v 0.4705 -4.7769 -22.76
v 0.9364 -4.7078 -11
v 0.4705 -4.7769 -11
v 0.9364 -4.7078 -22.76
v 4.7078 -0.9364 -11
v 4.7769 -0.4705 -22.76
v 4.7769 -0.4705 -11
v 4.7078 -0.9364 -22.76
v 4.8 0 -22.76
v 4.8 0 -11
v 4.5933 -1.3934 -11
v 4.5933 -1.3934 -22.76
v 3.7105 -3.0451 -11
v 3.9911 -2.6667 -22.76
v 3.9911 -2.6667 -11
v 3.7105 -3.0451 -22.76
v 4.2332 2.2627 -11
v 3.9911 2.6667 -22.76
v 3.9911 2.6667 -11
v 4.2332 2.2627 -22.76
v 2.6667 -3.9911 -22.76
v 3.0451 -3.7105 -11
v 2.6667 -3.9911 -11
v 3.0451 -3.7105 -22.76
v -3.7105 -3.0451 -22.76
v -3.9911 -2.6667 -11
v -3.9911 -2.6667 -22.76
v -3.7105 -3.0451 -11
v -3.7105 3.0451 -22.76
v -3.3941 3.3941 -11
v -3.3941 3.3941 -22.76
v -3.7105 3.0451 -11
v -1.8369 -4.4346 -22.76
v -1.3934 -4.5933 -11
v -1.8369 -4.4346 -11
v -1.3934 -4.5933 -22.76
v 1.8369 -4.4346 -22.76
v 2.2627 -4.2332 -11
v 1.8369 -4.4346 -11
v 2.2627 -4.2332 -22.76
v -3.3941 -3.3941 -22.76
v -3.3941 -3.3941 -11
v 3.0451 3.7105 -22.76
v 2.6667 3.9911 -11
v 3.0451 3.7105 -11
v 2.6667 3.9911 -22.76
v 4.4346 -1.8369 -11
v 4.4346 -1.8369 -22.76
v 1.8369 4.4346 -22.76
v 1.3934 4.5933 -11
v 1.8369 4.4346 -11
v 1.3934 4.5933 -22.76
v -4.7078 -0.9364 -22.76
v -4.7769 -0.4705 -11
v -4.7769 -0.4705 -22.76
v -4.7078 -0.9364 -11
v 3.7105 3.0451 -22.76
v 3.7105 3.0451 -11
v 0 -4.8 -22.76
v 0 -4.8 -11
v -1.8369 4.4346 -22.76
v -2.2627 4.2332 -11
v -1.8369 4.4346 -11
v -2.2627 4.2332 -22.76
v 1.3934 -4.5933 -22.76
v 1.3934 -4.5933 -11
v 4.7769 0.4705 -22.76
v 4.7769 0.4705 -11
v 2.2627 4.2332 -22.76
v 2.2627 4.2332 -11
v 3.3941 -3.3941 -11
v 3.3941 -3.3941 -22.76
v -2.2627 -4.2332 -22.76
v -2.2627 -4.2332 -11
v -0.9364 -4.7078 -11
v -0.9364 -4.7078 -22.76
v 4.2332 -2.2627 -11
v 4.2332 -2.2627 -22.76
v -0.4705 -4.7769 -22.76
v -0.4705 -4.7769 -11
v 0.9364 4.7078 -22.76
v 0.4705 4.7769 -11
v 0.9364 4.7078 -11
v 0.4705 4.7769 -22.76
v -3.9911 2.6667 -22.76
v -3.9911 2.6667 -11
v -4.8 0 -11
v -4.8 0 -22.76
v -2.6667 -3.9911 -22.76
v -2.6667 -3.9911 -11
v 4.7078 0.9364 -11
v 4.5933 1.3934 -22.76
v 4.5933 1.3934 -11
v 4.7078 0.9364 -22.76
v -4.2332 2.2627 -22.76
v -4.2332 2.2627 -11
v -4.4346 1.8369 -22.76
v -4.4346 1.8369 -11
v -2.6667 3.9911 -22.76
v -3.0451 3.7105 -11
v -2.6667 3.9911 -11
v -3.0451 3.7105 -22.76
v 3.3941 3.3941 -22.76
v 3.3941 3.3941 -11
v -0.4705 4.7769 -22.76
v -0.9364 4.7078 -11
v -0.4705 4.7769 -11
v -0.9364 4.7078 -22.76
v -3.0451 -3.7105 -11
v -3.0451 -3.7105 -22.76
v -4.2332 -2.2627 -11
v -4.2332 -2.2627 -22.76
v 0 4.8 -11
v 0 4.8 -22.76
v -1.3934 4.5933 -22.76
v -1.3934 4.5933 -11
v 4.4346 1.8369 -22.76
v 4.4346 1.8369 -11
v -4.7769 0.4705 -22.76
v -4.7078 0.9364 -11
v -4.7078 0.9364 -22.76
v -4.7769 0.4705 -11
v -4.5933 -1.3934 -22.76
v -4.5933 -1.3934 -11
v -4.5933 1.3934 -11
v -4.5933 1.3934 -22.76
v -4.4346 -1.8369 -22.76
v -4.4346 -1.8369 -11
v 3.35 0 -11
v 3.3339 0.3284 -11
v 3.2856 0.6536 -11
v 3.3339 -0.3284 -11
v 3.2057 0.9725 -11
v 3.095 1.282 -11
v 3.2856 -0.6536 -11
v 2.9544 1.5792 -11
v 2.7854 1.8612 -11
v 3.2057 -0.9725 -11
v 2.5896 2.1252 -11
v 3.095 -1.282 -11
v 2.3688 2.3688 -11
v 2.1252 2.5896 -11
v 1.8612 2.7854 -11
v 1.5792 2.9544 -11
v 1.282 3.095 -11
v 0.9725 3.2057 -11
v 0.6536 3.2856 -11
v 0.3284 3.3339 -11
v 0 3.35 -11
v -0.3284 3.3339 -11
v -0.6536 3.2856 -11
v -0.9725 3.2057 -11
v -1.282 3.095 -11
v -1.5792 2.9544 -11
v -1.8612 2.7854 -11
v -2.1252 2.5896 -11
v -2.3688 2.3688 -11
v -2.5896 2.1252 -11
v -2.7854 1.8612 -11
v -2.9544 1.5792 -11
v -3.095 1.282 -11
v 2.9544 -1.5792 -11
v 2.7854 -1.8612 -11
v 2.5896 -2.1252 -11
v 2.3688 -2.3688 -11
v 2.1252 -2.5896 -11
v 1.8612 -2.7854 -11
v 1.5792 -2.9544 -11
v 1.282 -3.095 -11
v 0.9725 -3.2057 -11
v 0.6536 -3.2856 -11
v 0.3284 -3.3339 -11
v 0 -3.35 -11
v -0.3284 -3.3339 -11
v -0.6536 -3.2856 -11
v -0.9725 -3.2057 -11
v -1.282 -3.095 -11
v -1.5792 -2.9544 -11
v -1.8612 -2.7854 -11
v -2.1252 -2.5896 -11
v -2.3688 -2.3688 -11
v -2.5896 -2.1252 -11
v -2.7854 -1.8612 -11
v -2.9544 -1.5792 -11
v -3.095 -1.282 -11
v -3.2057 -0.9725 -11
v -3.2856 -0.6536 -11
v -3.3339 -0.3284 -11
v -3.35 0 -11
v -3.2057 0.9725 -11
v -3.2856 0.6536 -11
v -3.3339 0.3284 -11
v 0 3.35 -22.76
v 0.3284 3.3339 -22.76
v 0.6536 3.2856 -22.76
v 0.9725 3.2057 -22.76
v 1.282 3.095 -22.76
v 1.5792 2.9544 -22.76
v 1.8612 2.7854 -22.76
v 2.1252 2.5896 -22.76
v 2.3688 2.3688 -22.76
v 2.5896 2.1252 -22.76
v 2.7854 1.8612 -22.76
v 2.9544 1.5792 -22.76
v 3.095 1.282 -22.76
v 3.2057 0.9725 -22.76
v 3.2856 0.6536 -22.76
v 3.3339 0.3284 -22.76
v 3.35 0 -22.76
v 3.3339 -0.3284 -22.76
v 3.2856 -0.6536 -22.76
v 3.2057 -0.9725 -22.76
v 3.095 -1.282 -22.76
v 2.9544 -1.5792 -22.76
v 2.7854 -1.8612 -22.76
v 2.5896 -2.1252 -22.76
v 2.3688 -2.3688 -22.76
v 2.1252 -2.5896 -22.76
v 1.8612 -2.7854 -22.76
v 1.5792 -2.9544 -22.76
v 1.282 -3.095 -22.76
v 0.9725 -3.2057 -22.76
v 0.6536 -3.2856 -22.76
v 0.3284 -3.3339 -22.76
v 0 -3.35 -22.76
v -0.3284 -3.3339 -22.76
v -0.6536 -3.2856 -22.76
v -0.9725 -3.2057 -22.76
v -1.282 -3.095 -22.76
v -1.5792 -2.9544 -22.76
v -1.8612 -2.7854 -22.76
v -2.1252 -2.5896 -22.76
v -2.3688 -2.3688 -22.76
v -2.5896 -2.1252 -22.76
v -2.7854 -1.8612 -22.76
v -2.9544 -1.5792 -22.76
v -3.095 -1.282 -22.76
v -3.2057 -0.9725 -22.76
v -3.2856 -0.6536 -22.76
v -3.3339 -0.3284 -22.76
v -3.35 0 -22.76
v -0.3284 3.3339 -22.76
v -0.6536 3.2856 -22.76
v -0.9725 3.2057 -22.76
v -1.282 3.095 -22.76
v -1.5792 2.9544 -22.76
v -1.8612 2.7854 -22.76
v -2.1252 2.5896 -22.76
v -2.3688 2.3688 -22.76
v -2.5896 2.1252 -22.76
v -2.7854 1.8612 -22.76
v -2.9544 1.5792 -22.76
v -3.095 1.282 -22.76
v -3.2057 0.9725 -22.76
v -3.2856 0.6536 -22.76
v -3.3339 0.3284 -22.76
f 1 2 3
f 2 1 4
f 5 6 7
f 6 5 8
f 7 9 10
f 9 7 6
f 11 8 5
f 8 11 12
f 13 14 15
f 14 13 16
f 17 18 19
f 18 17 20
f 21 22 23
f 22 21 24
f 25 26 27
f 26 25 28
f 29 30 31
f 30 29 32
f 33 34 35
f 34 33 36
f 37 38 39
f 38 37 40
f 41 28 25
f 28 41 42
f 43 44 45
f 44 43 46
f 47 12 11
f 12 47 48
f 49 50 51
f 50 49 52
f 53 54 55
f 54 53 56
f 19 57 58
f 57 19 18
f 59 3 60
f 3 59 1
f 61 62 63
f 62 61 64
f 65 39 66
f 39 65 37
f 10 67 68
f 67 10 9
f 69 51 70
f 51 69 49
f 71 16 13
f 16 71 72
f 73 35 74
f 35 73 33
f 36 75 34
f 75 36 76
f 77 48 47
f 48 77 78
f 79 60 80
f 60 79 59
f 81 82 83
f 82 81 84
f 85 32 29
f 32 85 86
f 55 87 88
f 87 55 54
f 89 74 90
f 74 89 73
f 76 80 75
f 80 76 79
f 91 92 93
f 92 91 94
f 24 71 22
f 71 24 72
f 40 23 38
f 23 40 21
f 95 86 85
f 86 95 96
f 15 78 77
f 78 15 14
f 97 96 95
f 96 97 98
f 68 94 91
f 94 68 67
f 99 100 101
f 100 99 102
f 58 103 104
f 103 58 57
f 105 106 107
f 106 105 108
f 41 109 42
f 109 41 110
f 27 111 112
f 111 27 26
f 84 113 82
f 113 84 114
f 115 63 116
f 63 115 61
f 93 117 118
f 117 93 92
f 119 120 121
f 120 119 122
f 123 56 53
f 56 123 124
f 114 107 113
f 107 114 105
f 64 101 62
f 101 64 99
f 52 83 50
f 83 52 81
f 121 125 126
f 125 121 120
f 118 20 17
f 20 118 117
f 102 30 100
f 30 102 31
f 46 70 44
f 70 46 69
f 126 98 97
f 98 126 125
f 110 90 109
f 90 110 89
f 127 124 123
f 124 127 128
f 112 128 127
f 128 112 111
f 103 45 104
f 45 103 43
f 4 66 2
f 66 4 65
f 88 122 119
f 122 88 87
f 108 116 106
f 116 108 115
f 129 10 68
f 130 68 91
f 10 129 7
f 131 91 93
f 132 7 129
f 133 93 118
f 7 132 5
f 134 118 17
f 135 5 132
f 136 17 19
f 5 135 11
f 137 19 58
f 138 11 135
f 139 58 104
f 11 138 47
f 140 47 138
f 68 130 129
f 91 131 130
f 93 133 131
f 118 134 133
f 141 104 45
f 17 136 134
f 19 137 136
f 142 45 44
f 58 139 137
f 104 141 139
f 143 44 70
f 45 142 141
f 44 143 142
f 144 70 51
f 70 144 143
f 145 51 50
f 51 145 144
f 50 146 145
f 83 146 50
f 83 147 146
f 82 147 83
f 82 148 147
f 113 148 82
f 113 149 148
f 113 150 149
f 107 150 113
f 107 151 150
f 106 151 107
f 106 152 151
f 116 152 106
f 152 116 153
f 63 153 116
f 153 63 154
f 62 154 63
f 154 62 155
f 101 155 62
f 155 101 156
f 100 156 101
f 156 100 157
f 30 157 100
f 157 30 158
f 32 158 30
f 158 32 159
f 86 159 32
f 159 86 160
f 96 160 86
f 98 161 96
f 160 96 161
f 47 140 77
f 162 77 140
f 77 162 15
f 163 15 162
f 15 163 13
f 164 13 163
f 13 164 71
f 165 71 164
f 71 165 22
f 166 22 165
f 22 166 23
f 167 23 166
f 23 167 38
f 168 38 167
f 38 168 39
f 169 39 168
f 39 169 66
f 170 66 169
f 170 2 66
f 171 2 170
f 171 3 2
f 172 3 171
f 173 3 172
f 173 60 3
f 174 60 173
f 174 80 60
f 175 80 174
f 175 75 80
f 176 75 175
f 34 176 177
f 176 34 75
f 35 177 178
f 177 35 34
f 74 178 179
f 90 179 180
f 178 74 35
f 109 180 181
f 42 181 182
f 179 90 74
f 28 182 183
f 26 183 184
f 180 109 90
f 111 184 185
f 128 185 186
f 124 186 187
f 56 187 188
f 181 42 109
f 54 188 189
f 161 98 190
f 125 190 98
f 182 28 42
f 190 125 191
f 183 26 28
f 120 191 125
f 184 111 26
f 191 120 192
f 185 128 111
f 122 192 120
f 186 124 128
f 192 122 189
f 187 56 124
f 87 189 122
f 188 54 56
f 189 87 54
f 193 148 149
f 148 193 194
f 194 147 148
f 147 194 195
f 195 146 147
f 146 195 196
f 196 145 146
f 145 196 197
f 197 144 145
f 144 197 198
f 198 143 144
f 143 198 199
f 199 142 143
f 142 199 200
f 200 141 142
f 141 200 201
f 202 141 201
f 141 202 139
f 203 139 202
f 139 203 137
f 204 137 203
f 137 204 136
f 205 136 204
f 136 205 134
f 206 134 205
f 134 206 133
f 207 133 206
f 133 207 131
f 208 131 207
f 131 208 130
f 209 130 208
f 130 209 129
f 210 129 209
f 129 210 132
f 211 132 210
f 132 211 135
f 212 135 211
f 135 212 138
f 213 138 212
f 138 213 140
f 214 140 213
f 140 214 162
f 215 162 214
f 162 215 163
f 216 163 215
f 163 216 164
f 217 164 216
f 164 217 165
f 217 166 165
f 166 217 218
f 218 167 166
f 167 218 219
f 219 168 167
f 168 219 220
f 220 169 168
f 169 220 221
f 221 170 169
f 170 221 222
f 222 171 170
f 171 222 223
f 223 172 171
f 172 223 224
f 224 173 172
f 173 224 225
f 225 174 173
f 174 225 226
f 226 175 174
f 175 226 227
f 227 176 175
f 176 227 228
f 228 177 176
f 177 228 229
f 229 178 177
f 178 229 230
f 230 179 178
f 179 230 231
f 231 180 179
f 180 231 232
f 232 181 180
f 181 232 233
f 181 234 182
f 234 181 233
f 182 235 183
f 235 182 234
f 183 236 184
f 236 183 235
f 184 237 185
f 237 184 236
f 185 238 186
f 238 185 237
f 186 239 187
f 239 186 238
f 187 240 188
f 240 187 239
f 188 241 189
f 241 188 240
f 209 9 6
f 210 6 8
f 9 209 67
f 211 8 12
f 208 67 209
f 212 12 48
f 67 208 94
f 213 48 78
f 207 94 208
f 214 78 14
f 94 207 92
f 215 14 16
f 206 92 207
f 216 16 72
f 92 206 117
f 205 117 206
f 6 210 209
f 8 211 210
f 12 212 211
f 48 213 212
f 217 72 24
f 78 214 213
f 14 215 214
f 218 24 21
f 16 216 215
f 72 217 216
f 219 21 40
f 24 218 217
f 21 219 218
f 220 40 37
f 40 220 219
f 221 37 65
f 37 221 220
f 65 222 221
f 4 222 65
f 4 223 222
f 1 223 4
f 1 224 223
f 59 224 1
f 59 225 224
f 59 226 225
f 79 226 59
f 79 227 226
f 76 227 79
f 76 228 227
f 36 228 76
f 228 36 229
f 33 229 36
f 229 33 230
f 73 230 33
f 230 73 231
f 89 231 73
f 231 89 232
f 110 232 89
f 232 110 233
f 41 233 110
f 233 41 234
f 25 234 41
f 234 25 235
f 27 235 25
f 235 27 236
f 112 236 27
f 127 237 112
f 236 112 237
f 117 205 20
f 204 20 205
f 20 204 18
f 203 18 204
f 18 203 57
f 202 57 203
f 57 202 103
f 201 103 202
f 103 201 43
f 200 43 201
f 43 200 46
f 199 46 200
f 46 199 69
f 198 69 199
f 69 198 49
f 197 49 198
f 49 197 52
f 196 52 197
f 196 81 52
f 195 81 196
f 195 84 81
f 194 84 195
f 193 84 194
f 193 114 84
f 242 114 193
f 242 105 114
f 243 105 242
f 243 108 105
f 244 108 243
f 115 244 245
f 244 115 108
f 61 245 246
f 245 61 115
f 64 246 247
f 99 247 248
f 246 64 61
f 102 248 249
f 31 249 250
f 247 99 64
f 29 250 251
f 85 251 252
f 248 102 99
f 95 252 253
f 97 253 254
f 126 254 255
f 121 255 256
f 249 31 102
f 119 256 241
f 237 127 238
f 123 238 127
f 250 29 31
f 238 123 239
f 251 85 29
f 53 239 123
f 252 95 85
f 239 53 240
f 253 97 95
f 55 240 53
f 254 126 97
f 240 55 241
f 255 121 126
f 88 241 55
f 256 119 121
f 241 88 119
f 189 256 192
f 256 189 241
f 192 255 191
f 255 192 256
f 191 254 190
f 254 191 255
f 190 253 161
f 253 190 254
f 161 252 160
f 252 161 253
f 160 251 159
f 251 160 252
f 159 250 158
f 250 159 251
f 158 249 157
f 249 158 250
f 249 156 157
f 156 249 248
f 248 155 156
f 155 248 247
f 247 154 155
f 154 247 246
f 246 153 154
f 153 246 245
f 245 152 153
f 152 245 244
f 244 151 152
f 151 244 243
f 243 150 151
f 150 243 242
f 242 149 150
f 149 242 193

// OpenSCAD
// Start: lazy_union
default_5_default_5();
// End: lazy_union

// Modules.

// 'PartMaterial undef-default - default 5.0'
module default_5_default_5() {
  // 'None : _combine_solids_and_holes'
  union() {
    // '_combine_solids_and_holes'
    difference() {
      // 'show_cage : _combine_solids_and_holes'
      union() {
        // 'thru_shaft'
        multmatrix(m=[[1.0, 0.0, 0.0, 0.0], [0.0, -1.0, 0.0, 0.0], [0.0, 0.0, -1.0, -11.0], [0.0, 0.0, 0.0, 1.0]]) {
          // 'thru_shaft : _combine_solids_and_holes'
          union() {
            // 'thru_shaft'
            cylinder(h=14.0, r1=4.800000000000001, r2=4.800000000000001, center=false, $fn=64);
          }
        }
      }
      // 'show_cage'
      multmatrix(m=[[1.0, 0.0, 0.0, 0.0], [0.0, -1.0, 0.0, 0.0], [0.0, 0.0, -1.0, -24.999], [0.0, 0.0, 0.0, 1.0]]) {
        // 'access_hole : _combine_solids_and_holes'
        union() {
          // 'access_hole'
          cylinder(h=10.0, r1=4.800000000000001, r2=4.800000000000001, center=false, $fn=64);
        }
      }
      // 'show_cage'
      multmatrix(m=[[0.0, -1.0, 0.0, 0.0], [-1.0, 0.0, 0.0, 0.0], [0.0, 0.0, -1.0, 0.0], [0.0, 0.0, 0.0, 1.0]]) {
        // 'screw_hole : _combine_solids_and_holes'
        union() {
          // 'screw_hole'
          polyhedron(points=[[0.0, 0.0, 0.0], [-3.2, 0.0, 0.0], [-3.2, 0.0, 11.0], [-3.35, 0.0, 11.0], [-3.35, 0.0, 22.759999999999998], [-4.800000000000001, 0.0, 22.759999999999998], [-4.800000000000001, 0.0, 25.0], [0.0, 0.0, 25.0], [0.0, 0.0, 0.0], [-3.18459112535103, -0.31365484905459395, 0.0], [-3.18459112535103, -0.31365484905459395, 11.0], [-3.33386883435186, -0.328357420104028, 11.0], [-3.33386883435186, -0.328357420104028, 22.759999999999998], [-4.776886688026546, -0.470482273581891, 22.759999999999998], [-4.776886688026546, -0.470482273581891, 25.0], [0.0, 0.0, 25.0], [0.0, 0.0, 0.0], [-3.1385128972903376, -0.6242890304516104, 0.0], [-3.1385128972903376, -0.6242890304516104, 11.0], [-3.285630689350822, -0.6535525787540296, 11.0], [-3.285630689350822, -0.6535525787540296, 22.759999999999998], [-4.707769345935507, -0.9364335456774158, 22.759999999999998], [-4.707769345935507, -0.9364335456774158, 25.0], [0.0, 0.0, 25.0], [0.0, 0.0, 0.0], [-3.0622090743430683, -0.9289109672142795, 0.0], [-3.0622090743430683, -0.9289109672142795, 11.0], [-3.2057501247028997, -0.9724536688024489, 11.0], [-3.2057501247028997, -0.9724536688024489, 22.759999999999998], [-4.593313611514603, -1.3933664508214194, 22.759999999999998], [-4.593313611514603, -1.3933664508214194, 25.0], [0.0, 0.0, 25.0], [0.0, 0.0, 0.0], [-2.956414504036118, -1.2245869835682874, 0.0], [-2.956414504036118, -1.2245869835682874, 11.0], [-3.0949964339128107, -1.2819894984230509, 11.0], [-3.0949964339128107, -1.2819894984230509, 22.759999999999998], [-4.434621756054177, -1.8368804753524313, 22.759999999999998], [-4.434621756054177, -1.8368804753524313, 25.0], [0.0, 0.0, 25.0], [0.0, 0.0, 0.0], [-2.8221480459147363, -1.5084695578431926, 0.0], [-2.8221480459147363, -1.5084695578431926, 11.0], [-2.9544362355669893, -1.579179068367092, 11.0], [-2.9544362355669893, -1.579179068367092, 22.759999999999998], [-4.233222068872105, -2.262704336764789, 22.759999999999998], [-4.233222068872105, -2.262704336764789, 25.0], [0.0, 0.0, 25.0], [0.0, 0.0, 0.0], [-2.660702759368145, -1.777824745662727, 0.0], [-2.660702759368145, -1.777824745662727, 11.0], [-2.7854232012135265, -1.8611602806156673, 11.0], [-2.7854232012135265, -1.8611602806156673, 22.759999999999998], [-3.991054139052218, -2.666737118494091, 22.759999999999998], [-3.991054139052218, -2.666737118494091, 25.0], [0.0, 0.0, 25.0], [0.0, 0.0, 0.0], [-2.4736334507607585, -2.030058509323666, 0.0], [-2.4736334507607585, -2.030058509323666, 11.0], [-2.589585018765169, -2.1252175019482125, 11.0], [-2.589585018765169, -2.1252175019482125, 22.759999999999998], [-3.710450176141138, -3.045087763985499, 22.759999999999998], [-3.710450176141138, -3.045087763985499, 25.0], [0.0, 0.0, 25.0], [0.0, 0.0, 0.0], [-2.2627416997969525, -2.2627416997969525, 0.0], [-2.2627416997969525, -2.2627416997969525, 11.0], [-2.3688077169749344, -2.3688077169749344, 11.0], [-2.3688077169749344, -2.3688077169749344, 22.759999999999998], [-3.394112549695429, -3.394112549695429, 22.759999999999998], [-3.394112549695429, -3.394112549695429, 25.0], [0.0, 0.0, 25.0], [0.0, 0.0, 0.0], [-2.030058509323666, -2.473633450760758, 0.0], [-2.030058509323666, -2.473633450760758, 11.0], [-2.1252175019482125, -2.5895850187651686, 11.0], [-2.1252175019482125, -2.5895850187651686, 22.759999999999998], [-3.045087763985499, -3.7104501761411375, 22.759999999999998], [-3.045087763985499, -3.7104501761411375, 25.0], [0.0, 0.0, 25.0], [0.0, 0.0, 0.0], [-1.7778247456627274, -2.660702759368145, 0.0], [-1.7778247456627274, -2.660702759368145, 11.0], [-1.8611602806156677, -2.7854232012135265, 11.0], [-1.8611602806156677, -2.7854232012135265, 22.759999999999998], [-2.6667371184940913, -3.991054139052218, 22.759999999999998], [-2.6667371184940913, -3.991054139052218, 25.0], [0.0, 0.0, 25.0], [0.0, 0.0, 0.0], [-1.508469557843193, -2.822148045914736, 0.0], [-1.508469557843193, -2.822148045914736, 11.0], [-1.5791790683670928, -2.9544362355669893, 11.0], [-1.5791790683670928, -2.9544362355669893, 22.759999999999998], [-2.2627043367647897, -4.233222068872104, 22.759999999999998], [-2.2627043367647897, -4.233222068872104, 25.0], [0.0, 0.0, 25.0], [0.0, 0.0, 0.0], [-1.2245869835682877, -2.956414504036118, 0.0], [-1.2245869835682877, -2.956414504036118, 11.0], [-1.281989498423051, -3.0949964339128107, 11.0], [-1.281989498423051, -3.0949964339128107, 22.759999999999998], [-1.8368804753524315, -4.434621756054177, 22.759999999999998], [-1.8368804753524315, -4.434621756054177, 25.0], [0.0, 0.0, 25.0], [0.0, 0.0, 0.0], [-0.9289109672142795, -3.0622090743430688, 0.0], [-0.9289109672142795, -3.0622090743430688, 11.0], [-0.9724536688024489, -3.2057501247029, 11.0], [-0.9724536688024489, -3.2057501247029, 22.759999999999998], [-1.3933664508214194, -4.593313611514604, 22.759999999999998], [-1.3933664508214194, -4.593313611514604, 25.0], [0.0, 0.0, 25.0], [0.0, 0.0, 0.0], [-0.6242890304516107, -3.1385128972903376, 0.0], [-0.6242890304516107, -3.1385128972903376, 11.0], [-0.65355257875403, -3.285630689350822, 11.0], [-0.65355257875403, -3.285630689350822, 22.759999999999998], [-0.9364335456774161, -4.707769345935507, 22.759999999999998], [-0.9364335456774161, -4.707769345935507, 25.0], [0.0, 0.0, 25.0], [0.0, 0.0, 0.0], [-0.3136548490545945, -3.18459112535103, 0.0], [-0.3136548490545945, -3.18459112535103, 11.0], [-0.3283574201040286, -3.3338688343518594, 11.0], [-0.3283574201040286, -3.3338688343518594, 22.759999999999998], [-0.47048227358189176, -4.776886688026545, 22.759999999999998], [-0.47048227358189176, -4.776886688026545, 25.0], [0.0, 0.0, 25.0], [0.0, 0.0, 0.0], [0.0, -3.2, 0.0], [0.0, -3.2, 11.0], [0.0, -3.35, 11.0], [0.0, -3.35, 22.759999999999998], [0.0, -4.800000000000001, 22.759999999999998], [0.0, -4.800000000000001, 25.0], [0.0, 0.0, 25.0], [0.0, 0.0, 0.0], [0.31365484905459406, -3.18459112535103, 0.0], [0.31365484905459406, -3.18459112535103, 11.0], [0.3283574201040282, -3.33386883435186, 11.0], [0.3283574201040282, -3.33386883435186, 22.759999999999998], [0.47048227358189115, -4.776886688026546, 22.759999999999998], [0.47048227358189115, -4.776886688026546, 25.0], [0.0, 0.0, 25.0], [0.0, 0.0, 0.0], [0.6242890304516102, -3.1385128972903376, 0.0], [0.6242890304516102, -3.1385128972903376, 11.0], [0.6535525787540295, -3.285630689350822, 11.0], [0.6535525787540295, -3.285630689350822, 22.759999999999998], [0.9364335456774154, -4.707769345935507, 22.759999999999998], [0.9364335456774154, -4.707769345935507, 25.0], [0.0, 0.0, 25.0], [0.0, 0.0, 0.0], [0.928910967214279, -3.0622090743430688, 0.0], [0.928910967214279, -3.0622090743430688, 11.0], [0.9724536688024483, -3.2057501247029, 11.0], [0.9724536688024483, -3.2057501247029, 22.759999999999998], [1.3933664508214185, -4.593313611514604, 22.759999999999998], [1.3933664508214185, -4.593313611514604, 25.0], [0.0, 0.0, 25.0], [0.0, 0.0, 0.0], [1.2245869835682872, -2.956414504036118, 0.0], [1.2245869835682872, -2.956414504036118, 11.0], [1.2819894984230507, -3.0949964339128107, 11.0], [1.2819894984230507, -3.0949964339128107, 22.759999999999998], [1.836880475352431, -4.434621756054177, 22.759999999999998], [1.836880475352431, -4.434621756054177, 25.0], [0.0, 0.0, 25.0], [0.0, 0.0, 0.0], [1.5084695578431928, -2.8221480459147363, 0.0], [1.5084695578431928, -2.8221480459147363, 11.0], [1.5791790683670923, -2.9544362355669893, 11.0], [1.5791790683670923, -2.9544362355669893, 22.759999999999998], [2.262704336764789, -4.233222068872105, 22.759999999999998], [2.262704336764789, -4.233222068872105, 25.0], [0.0, 0.0, 25.0], [0.0, 0.0, 0.0], [1.7778247456627263, -2.6607027593681454, 0.0], [1.7778247456627263, -2.6607027593681454, 11.0], [1.8611602806156666, -2.785423201213527, 11.0], [1.8611602806156666, -2.785423201213527, 22.759999999999998], [2.6667371184940896, -3.9910541390522183, 22.759999999999998], [2.6667371184940896, -3.9910541390522183, 25.0], [0.0, 0.0, 25.0], [0.0, 0.0, 0.0], [2.0300585093236654, -2.473633450760759, 0.0], [2.0300585093236654, -2.473633450760759, 11.0], [2.125217501948212, -2.5895850187651694, 11.0], [2.125217501948212, -2.5895850187651694, 22.759999999999998], [3.045087763985498, -3.710450176141139, 22.759999999999998], [3.045087763985498, -3.710450176141139, 25.0], [0.0, 0.0, 25.0], [0.0, 0.0, 0.0], [2.262741699796952, -2.2627416997969525, 0.0], [2.262741699796952, -2.2627416997969525, 11.0], [2.368807716974934, -2.3688077169749344, 11.0], [2.368807716974934, -2.3688077169749344, 22.759999999999998], [3.3941125496954285, -3.394112549695429, 22.759999999999998], [3.3941125496954285, -3.394112549695429, 25.0], [0.0, 0.0, 25.0], [0.0, 0.0, 0.0], [2.4736334507607585, -2.030058509323666, 0.0], [2.4736334507607585, -2.030058509323666, 11.0], [2.589585018765169, -2.1252175019482125, 11.0], [2.589585018765169, -2.1252175019482125, 22.759999999999998], [3.710450176141138, -3.045087763985499, 22.759999999999998], [3.710450176141138, -3.045087763985499, 25.0], [0.0, 0.0, 25.0], [0.0, 0.0, 0.0], [2.6607027593681454, -1.777824745662727, 0.0], [2.6607027593681454, -1.777824745662727, 11.0], [2.785423201213527, -1.8611602806156673, 11.0], [2.785423201213527, -1.8611602806156673, 22.759999999999998], [3.9910541390522183, -2.666737118494091, 22.759999999999998], [3.9910541390522183, -2.666737118494091, 25.0], [0.0, 0.0, 25.0], [0.0, 0.0, 0.0], [2.822148045914736, -1.508469557843193, 0.0], [2.822148045914736, -1.508469557843193, 11.0], [2.9544362355669893, -1.5791790683670928, 11.0], [2.9544362355669893, -1.5791790683670928, 22.759999999999998], [4.233222068872104, -2.2627043367647897, 22.759999999999998], [4.233222068872104, -2.2627043367647897, 25.0], [0.0, 0.0, 25.0], [0.0, 0.0, 0.0], [2.956414504036118, -1.2245869835682877, 0.0], [2.956414504036118, -1.2245869835682877, 11.0], [3.0949964339128107, -1.281989498423051, 11.0], [3.0949964339128107, -1.281989498423051, 22.759999999999998], [4.434621756054177, -1.8368804753524317, 22.759999999999998], [4.434621756054177, -1.8368804753524317, 25.0], [0.0, 0.0, 25.0], [0.0, 0.0, 0.0], [3.0622090743430683, -0.9289109672142797, 0.0], [3.0622090743430683, -0.9289109672142797, 11.0], [3.2057501247028997, -0.972453668802449, 11.0], [3.2057501247028997, -0.972453668802449, 22.759999999999998], [4.593313611514603, -1.3933664508214196, 22.759999999999998], [4.593313611514603, -1.3933664508214196, 25.0], [0.0, 0.0, 25.0], [0.0, 0.0, 0.0], [3.1385128972903376, -0.6242890304516115, 0.0], [3.1385128972903376, -0.6242890304516115, 11.0], [3.285630689350822, -0.6535525787540308, 11.0], [3.285630689350822, -0.6535525787540308, 22.759999999999998], [4.707769345935507, -0.9364335456774174, 22.759999999999998], [4.707769345935507, -0.9364335456774174, 25.0], [0.0, 0.0, 25.0], [0.0, 0.0, 0.0], [3.18459112535103, -0.3136548490545947, 0.0], [3.18459112535103, -0.3136548490545947, 11.0], [3.3338688343518594, -0.3283574201040288, 11.0], [3.3338688343518594, -0.3283574201040288, 22.759999999999998], [4.776886688026545, -0.47048227358189204, 22.759999999999998], [4.776886688026545, -0.47048227358189204, 25.0], [0.0, 0.0, 25.0], [0.0, 0.0, 0.0], [3.2, 0.0, 0.0], [3.2, 0.0, 11.0], [3.35, 0.0, 11.0], [3.35, 0.0, 22.759999999999998], [4.800000000000001, 0.0, 22.759999999999998], [4.800000000000001, 0.0, 25.0], [0.0, 0.0, 25.0], [0.0, 0.0, 0.0], [3.18459112535103, 0.3136548490545939, 0.0], [3.18459112535103, 0.3136548490545939, 11.0], [3.33386883435186, 0.32835742010402796, 11.0], [3.33386883435186, 0.32835742010402796, 22.759999999999998], [4.776886688026546, 0.4704822735818909, 22.759999999999998], [4.776886688026546, 0.4704822735818909, 25.0], [0.0, 0.0, 25.0], [0.0, 0.0, 0.0], [3.1385128972903376, 0.6242890304516108, 0.0], [3.1385128972903376, 0.6242890304516108, 11.0], [3.285630689350822, 0.6535525787540301, 11.0], [3.285630689350822, 0.6535525787540301, 22.759999999999998], [4.707769345935507, 0.9364335456774162, 22.759999999999998], [4.707769345935507, 0.9364335456774162, 25.0], [0.0, 0.0, 25.0], [0.0, 0.0, 0.0], [3.0622090743430688, 0.9289109672142788, 0.0], [3.0622090743430688, 0.9289109672142788, 11.0], [3.2057501247029, 0.9724536688024481, 11.0], [3.2057501247029, 0.9724536688024481, 22.759999999999998], [4.593313611514604, 1.3933664508214183, 22.759999999999998], [4.593313611514604, 1.3933664508214183, 25.0], [0.0, 0.0, 25.0], [0.0, 0.0, 0.0], [2.9564145040361183, 1.224586983568287, 0.0], [2.9564145040361183, 1.224586983568287, 11.0], [3.094996433912811, 1.2819894984230504, 11.0], [3.094996433912811, 1.2819894984230504, 22.759999999999998], [4.434621756054177, 1.8368804753524306, 22.759999999999998], [4.434621756054177, 1.8368804753524306, 25.0], [0.0, 0.0, 25.0], [0.0, 0.0, 0.0], [2.8221480459147363, 1.5084695578431926, 0.0], [2.8221480459147363, 1.5084695578431926, 11.0], [2.9544362355669893, 1.579179068367092, 11.0], [2.9544362355669893, 1.579179068367092, 22.759999999999998], [4.233222068872105, 2.262704336764789, 22.759999999999998], [4.233222068872105, 2.262704336764789, 25.0], [0.0, 0.0, 25.0], [0.0, 0.0, 0.0], [2.660702759368146, 1.7778247456627263, 0.0], [2.660702759368146, 1.7778247456627263, 11.0], [2.7854232012135274, 1.8611602806156666, 11.0], [2.7854232012135274, 1.8611602806156666, 22.759999999999998], [3.9910541390522187, 2.6667371184940896, 22.759999999999998], [3.9910541390522187, 2.6667371184940896, 25.0], [0.0, 0.0, 25.0], [0.0, 0.0, 0.0], [2.473633450760759, 2.030058509323665, 0.0], [2.473633450760759, 2.030058509323665, 11.0], [2.5895850187651694, 2.1252175019482116, 11.0], [2.5895850187651694, 2.1252175019482116, 22.759999999999998], [3.710450176141139, 3.0450877639854976, 22.759999999999998], [3.710450176141139, 3.0450877639854976, 25.0], [0.0, 0.0, 25.0], [0.0, 0.0, 0.0], [2.2627416997969525, 2.262741699796952, 0.0], [2.2627416997969525, 2.262741699796952, 11.0], [2.368807716974935, 2.368807716974934, 11.0], [2.368807716974935, 2.368807716974934, 22.759999999999998], [3.3941125496954294, 3.3941125496954285, 22.759999999999998], [3.3941125496954294, 3.3941125496954285, 25.0], [0.0, 0.0, 25.0], [0.0, 0.0, 0.0], [2.030058509323667, 2.4736334507607576, 0.0], [2.030058509323667, 2.4736334507607576, 11.0], [2.125217501948214, 2.5895850187651677, 11.0], [2.125217501948214, 2.5895850187651677, 22.759999999999998], [3.0450877639855007, 3.7104501761411366, 22.759999999999998], [3.0450877639855007, 3.7104501761411366, 25.0], [0.0, 0.0, 25.0], [0.0, 0.0, 0.0], [1.777824745662727, 2.660702759368145, 0.0], [1.777824745662727, 2.660702759368145, 11.0], [1.8611602806156673, 2.7854232012135265, 11.0], [1.8611602806156673, 2.7854232012135265, 22.759999999999998], [2.666737118494091, 3.991054139052218, 22.759999999999998], [2.666737118494091, 3.991054139052218, 25.0], [0.0, 0.0, 25.0], [0.0, 0.0, 0.0], [1.5084695578431933, 2.822148045914736, 0.0], [1.5084695578431933, 2.822148045914736, 11.0], [1.579179068367093, 2.9544362355669893, 11.0], [1.579179068367093, 2.9544362355669893, 22.759999999999998], [2.26270433676479, 4.233222068872104, 22.759999999999998], [2.26270433676479, 4.233222068872104, 25.0], [0.0, 0.0, 25.0], [0.0, 0.0, 0.0], [1.2245869835682892, 2.956414504036117, 0.0], [1.2245869835682892, 2.956414504036117, 11.0], [1.2819894984230527, 3.0949964339128098, 11.0], [1.2819894984230527, 3.0949964339128098, 22.759999999999998], [1.836880475352434, 4.434621756054176, 22.759999999999998], [1.836880475352434, 4.434621756054176, 25.0], [0.0, 0.0, 25.0], [0.0, 0.0, 0.0], [0.9289109672142799, 3.0622090743430683, 0.0], [0.9289109672142799, 3.0622090743430683, 11.0], [0.9724536688024492, 3.2057501247028997, 11.0], [0.9724536688024492, 3.2057501247028997, 22.759999999999998], [1.3933664508214199, 4.593313611514603, 22.759999999999998], [1.3933664508214199, 4.593313611514603, 25.0], [0.0, 0.0, 25.0], [0.0, 0.0, 0.0], [0.6242890304516118, 3.138512897290337, 0.0], [0.6242890304516118, 3.138512897290337, 11.0], [0.653552578754031, 3.2856306893508216, 11.0], [0.653552578754031, 3.2856306893508216, 22.759999999999998], [0.9364335456774178, 4.707769345935506, 22.759999999999998], [0.9364335456774178, 4.707769345935506, 25.0], [0.0, 0.0, 25.0], [0.0, 0.0, 0.0], [0.31365484905459345, 3.18459112535103, 0.0], [0.31365484905459345, 3.18459112535103, 11.0], [0.3283574201040275, 3.33386883435186, 11.0], [0.3283574201040275, 3.33386883435186, 22.759999999999998], [0.4704822735818902, 4.776886688026546, 22.759999999999998], [0.4704822735818902, 4.776886688026546, 25.0], [0.0, 0.0, 25.0], [0.0, 0.0, 0.0], [0.0, 3.2, 0.0], [0.0, 3.2, 11.0], [0.0, 3.35, 11.0], [0.0, 3.35, 22.759999999999998], [0.0, 4.800000000000001, 22.759999999999998], [0.0, 4.800000000000001, 25.0], [0.0, 0.0, 25.0], [0.0, 0.0, 0.0], [-0.3136548490545923, 3.18459112535103, 0.0], [-0.3136548490545923, 3.18459112535103, 11.0], [-0.3283574201040263, 3.33386883435186, 11.0], [-0.3283574201040263, 3.33386883435186, 22.759999999999998], [-0.4704822735818885, 4.776886688026546, 22.759999999999998], [-0.4704822735818885, 4.776886688026546, 25.0], [0.0, 0.0, 25.0], [0.0, 0.0, 0.0], [-0.6242890304516107, 3.1385128972903376, 0.0], [-0.6242890304516107, 3.1385128972903376, 11.0], [-0.6535525787540298, 3.285630689350822, 11.0], [-0.6535525787540298, 3.285630689350822, 22.759999999999998], [-0.936433545677416, 4.707769345935507, 22.759999999999998], [-0.936433545677416, 4.707769345935507, 25.0], [0.0, 0.0, 25.0], [0.0, 0.0, 0.0], [-0.9289109672142786, 3.0622090743430688, 0.0], [-0.9289109672142786, 3.0622090743430688, 11.0], [-0.9724536688024479, 3.2057501247029, 11.0], [-0.9724536688024479, 3.2057501247029, 22.759999999999998], [-1.393366450821418, 4.593313611514604, 22.759999999999998], [-1.393366450821418, 4.593313611514604, 25.0], [0.0, 0.0, 25.0], [0.0, 0.0, 0.0], [-1.224586983568288, 2.9564145040361174, 0.0], [-1.224586983568288, 2.9564145040361174, 11.0], [-1.2819894984230515, 3.09499643391281, 11.0], [-1.2819894984230515, 3.09499643391281, 22.759999999999998], [-1.8368804753524324, 4.4346217560541765, 22.759999999999998], [-1.8368804753524324, 4.4346217560541765, 25.0], [0.0, 0.0, 25.0], [0.0, 0.0, 0.0], [-1.5084695578431924, 2.8221480459147363, 0.0], [-1.5084695578431924, 2.8221480459147363, 11.0], [-1.5791790683670919, 2.9544362355669893, 11.0], [-1.5791790683670919, 2.9544362355669893, 22.759999999999998], [-2.2627043367647888, 4.233222068872105, 22.759999999999998], [-2.2627043367647888, 4.233222068872105, 25.0], [0.0, 0.0, 25.0], [0.0, 0.0, 0.0], [-1.777824745662726, 2.660702759368146, 0.0], [-1.777824745662726, 2.660702759368146, 11.0], [-1.8611602806156662, 2.7854232012135274, 11.0], [-1.8611602806156662, 2.7854232012135274, 22.759999999999998], [-2.666737118494089, 3.9910541390522187, 22.759999999999998], [-2.666737118494089, 3.9910541390522187, 25.0], [0.0, 0.0, 25.0], [0.0, 0.0, 0.0], [-2.030058509323666, 2.473633450760758, 0.0], [-2.030058509323666, 2.473633450760758, 11.0], [-2.125217501948213, 2.5895850187651686, 11.0], [-2.125217501948213, 2.5895850187651686, 22.759999999999998], [-3.0450877639854994, 3.7104501761411375, 22.759999999999998], [-3.0450877639854994, 3.7104501761411375, 25.0], [0.0, 0.0, 25.0], [0.0, 0.0, 0.0], [-2.2627416997969516, 2.2627416997969525, 0.0], [-2.2627416997969516, 2.2627416997969525, 11.0], [-2.3688077169749335, 2.368807716974935, 11.0], [-2.3688077169749335, 2.368807716974935, 22.759999999999998], [-3.3941125496954276, 3.3941125496954294, 22.759999999999998], [-3.3941125496954276, 3.3941125496954294, 25.0], [0.0, 0.0, 25.0], [0.0, 0.0, 0.0], [-2.473633450760757, 2.030058509323667, 0.0], [-2.473633450760757, 2.030058509323667, 11.0], [-2.5895850187651677, 2.125217501948214, 11.0], [-2.5895850187651677, 2.125217501948214, 22.759999999999998], [-3.710450176141136, 3.0450877639855007, 22.759999999999998], [-3.710450176141136, 3.0450877639855007, 25.0], [0.0, 0.0, 25.0], [0.0, 0.0, 0.0], [-2.660702759368145, 1.777824745662727, 0.0], [-2.660702759368145, 1.777824745662727, 11.0], [-2.7854232012135265, 1.8611602806156673, 11.0], [-2.7854232012135265, 1.8611602806156673, 22.759999999999998], [-3.991054139052218, 2.666737118494091, 22.759999999999998], [-3.991054139052218, 2.666737118494091, 25.0], [0.0, 0.0, 25.0], [0.0, 0.0, 0.0], [-2.8221480459147354, 1.5084695578431935, 0.0], [-2.8221480459147354, 1.5084695578431935, 11.0], [-2.954436235566989, 1.579179068367093, 11.0], [-2.954436235566989, 1.579179068367093, 22.759999999999998], [-4.233222068872104, 2.2627043367647905, 22.759999999999998], [-4.233222068872104, 2.2627043367647905, 25.0], [0.0, 0.0, 25.0], [0.0, 0.0, 0.0], [-2.956414504036117, 1.2245869835682894, 0.0], [-2.956414504036117, 1.2245869835682894, 11.0], [-3.0949964339128098, 1.2819894984230529, 11.0], [-3.0949964339128098, 1.2819894984230529, 22.759999999999998], [-4.434621756054176, 1.8368804753524341, 22.759999999999998], [-4.434621756054176, 1.8368804753524341, 25.0], [0.0, 0.0, 25.0], [0.0, 0.0, 0.0], [-3.0622090743430683, 0.92891096721428, 0.0], [-3.0622090743430683, 0.92891096721428, 11.0], [-3.2057501247028997, 0.9724536688024494, 11.0], [-3.2057501247028997, 0.9724536688024494, 22.759999999999998], [-4.593313611514603, 1.3933664508214203, 22.759999999999998], [-4.593313611514603, 1.3933664508214203, 25.0], [0.0, 0.0, 25.0], [0.0, 0.0, 0.0], [-3.138512897290337, 0.624289030451612, 0.0], [-3.138512897290337, 0.624289030451612, 11.0], [-3.2856306893508216, 0.6535525787540313, 11.0], [-3.2856306893508216, 0.6535525787540313, 22.759999999999998], [-4.707769345935506, 0.936433545677418, 22.759999999999998], [-4.707769345935506, 0.936433545677418, 25.0], [0.0, 0.0, 25.0], [0.0, 0.0, 0.0], [-3.18459112535103, 0.3136548490545936, 0.0], [-3.18459112535103, 0.3136548490545936, 11.0], [-3.33386883435186, 0.3283574201040277, 11.0], [-3.33386883435186, 0.3283574201040277, 22.759999999999998], [-4.776886688026546, 0.4704822735818905, 22.759999999999998], [-4.776886688026546, 0.4704822735818905, 25.0], [0.0, 0.0, 25.0], [0.0, 0.0, 0.0], [-3.2, 0.0, 0.0], [-3.2, 0.0, 11.0], [-3.35, 0.0, 11.0], [-3.35, 0.0, 22.759999999999998], [-4.800000000000001, 0.0, 22.759999999999998], [-4.800000000000001, 0.0, 25.0], [0.0, 0.0, 25.0]], faces=[[0, 8, 9, 1], [1, 9, 10, 2], [2, 10, 11, 3], [3, 11, 12, 4], [4, 12, 13, 5], [5, 13, 14, 6], [6, 14, 15, 7], [7, 15, 8, 0], [8, 16, 17, 9], [9, 17, 18, 10], [10, 18, 19, 11], [11, 19, 20, 12], [12, 20, 21, 13], [13, 21, 22, 14], [14, 22, 23, 15], [15, 23, 16, 8], [16, 24, 25, 17], [17, 25, 26, 18], [18, 26, 27, 19], [19, 27, 28, 20], [20, 28, 29, 21], [21, 29, 30, 22], [22, 30, 31, 23], [23, 31, 24, 16], [24, 32, 33, 25], [25, 33, 34, 26], [26, 34, 35, 27], [27, 35, 36, 28], [28, 36, 37, 29], [29, 37, 38, 30], [30, 38, 39, 31], [31, 39, 32, 24], [32, 40, 41, 33], [33, 41, 42, 34], [34, 42, 43, 35], [35, 43, 44, 36], [36, 44, 45, 37], [37, 45, 46, 38], [38, 46, 47, 39], [39, 47, 40, 32], [40, 48, 49, 41], [41, 49, 50, 42], [42, 50, 51, 43], [43, 51, 52, 44], [44, 52, 53, 45], [45, 53, 54, 46], [46, 54, 55, 47], [47, 55, 48, 40], [48, 56, 57, 49], [49, 57, 58, 50], [50, 58, 59, 51], [51, 59, 60, 52], [52, 60, 61, 53], [53, 61, 62, 54], [54, 62, 63, 55], [55, 63, 56, 48], [56, 64, 65, 57], [57, 65, 66, 58], [58, 66, 67, 59], [59, 67, 68, 60], [60, 68, 69, 61], [61, 69, 70, 62], [62, 70, 71, 63], [63, 71, 64, 56], [64, 72, 73, 65], [65, 73, 74, 66], [66, 74, 75, 67], [67, 75, 76, 68], [68, 76, 77, 69], [69, 77, 78, 70], [70, 78, 79, 71], [71, 79, 72, 64], [72, 80, 81, 73], [73, 81, 82, 74], [74, 82, 83, 75], [75, 83, 84, 76], [76, 84, 85, 77], [77, 85, 86, 78], [78, 86, 87, 79], [79, 87, 80, 72], [80, 88, 89, 81], [81, 89, 90, 82], [82, 90, 91, 83], [83, 91, 92, 84], [84, 92, 93, 85], [85, 93, 94, 86], [86, 94, 95, 87], [87, 95, 88, 80], [88, 96, 97, 89], [89, 97, 98, 90], [90, 98, 99, 91], [91, 99, 100, 92], [92, 100, 101, 93], [93, 101, 102, 94], [94, 102, 103, 95], [95, 103, 96, 88], [96, 104, 105, 97], [97, 105, 106, 98], [98, 106, 107, 99], [99, 107, 108, 100], [100, 108, 109, 101], [101, 109, 110, 102], [102, 110, 111, 103], [103, 111, 104, 96], [104, 112, 113, 105], [105, 113, 114, 106], [106, 114, 115, 107], [107, 115, 116, 108], [108, 116, 117, 109], [109, 117, 118, 110], [110, 118, 119, 111], [111, 119, 112, 104], [112, 120, 121, 113], [113, 121, 122, 114], [114, 122, 123, 115], [115, 123, 124, 116], [116, 124, 125, 117], [117, 125, 126, 118], [118, 126, 127, 119], [119, 127, 120, 112], [120, 128, 129, 121], [121, 129, 130, 122], [122, 130, 131, 123], [123, 131, 132, 124], [124, 132, 133, 125], [125, 133, 134, 126], [126, 134, 135, 127], [127, 135, 128, 120], [128, 136, 137, 129], [129, 137, 138, 130], [130, 138, 139, 131], [131, 139, 140, 132], [132, 140, 141, 133], [133, 141, 142, 134], [134, 142, 143, 135], [135, 143, 136, 128], [136, 144, 145, 137], [137, 145, 146, 138], [138, 146, 147, 139], [139, 147, 148, 140], [140, 148, 149, 141], [141, 149, 150, 142], [142, 150, 151, 143], [143, 151, 144, 136], [144, 152, 153, 145], [145, 153, 154, 146], [146, 154, 155, 147], [147, 155, 156, 148], [148, 156, 157, 149], [149, 157, 158, 150], [150, 158, 159, 151], [151, 159, 152, 144], [152, 160, 161, 153], [153, 161, 162, 154], [154, 162, 163, 155], [155, 163, 164, 156], [156, 164, 165, 157], [157, 165, 166, 158], [158, 166, 167, 159], [159, 167, 160, 152], [160, 168, 169, 161], [161, 169, 170, 162], [162, 170, 171, 163], [163, 171, 172, 164], [164, 172, 173, 165], [165, 173, 174, 166], [166, 174, 175, 167], [167, 175, 168, 160], [168, 176, 177, 169], [169, 177, 178, 170], [170, 178, 179, 171], [171, 179, 180, 172], [172, 180, 181, 173], [173, 181, 182, 174], [174, 182, 183, 175], [175, 183, 176, 168], [176, 184, 185, 177], [177, 185, 186, 178], [178, 186, 187, 179], [179, 187, 188, 180], [180, 188, 189, 181], [181, 189, 190, 182], [182, 190, 191, 183], [183, 191, 184, 176], [184, 192, 193, 185], [185, 193, 194, 186], [186, 194, 195, 187], [187, 195, 196, 188], [188, 196, 197, 189], [189, 197, 198, 190], [190, 198, 199, 191], [191, 199, 192, 184], [192, 200, 201, 193], [193, 201, 202, 194], [194, 202, 203, 195], [195, 203, 204, 196], [196, 204, 205, 197], [197, 205, 206, 198], [198, 206, 207, 199], [199, 207, 200, 192], [200, 208, 209, 201], [201, 209, 210, 202], [202, 210, 211, 203], [203, 211, 212, 204], [204, 212, 213, 205], [205, 213, 214, 206], [206, 214, 215, 207], [207, 215, 208, 200], [208, 216, 217, 209], [209, 217, 218, 210], [210, 218, 219, 211], [211, 219, 220, 212], [212, 220, 221, 213], [213, 221, 222, 214], [214, 222, 223, 215], [215, 223, 216, 208], [216, 224, 225, 217], [217, 225, 226, 218], [218, 226, 227, 219], [219, 227, 228, 220], [220, 228, 229, 221], [221, 229, 230, 222], [222, 230, 231, 223], [223, 231, 224, 216], [224, 232, 233, 225], [225, 233, 234, 226], [226, 234, 235, 227], [227, 235, 236, 228], [228, 236, 237, 229], [229, 237, 238, 230], [230, 238, 239, 231], [231, 239, 232, 224], [232, 240, 241, 233], [233, 241, 242, 234], [234, 242, 243, 235], [235, 243, 244, 236], [236, 244, 245, 237], [237, 245, 246, 238], [238, 246, 247, 239], [239, 247, 240, 232], [240, 248, 249, 241], [241, 249, 250, 242], [242, 250, 251, 243], [243, 251, 252, 244], [244, 252, 253, 245], [245, 253, 254, 246], [246, 254, 255, 247], [247, 255, 248, 240], [248, 256, 257, 249], [249, 257, 258, 250], [250, 258, 259, 251], [251, 259, 260, 252], [252, 260, 261, 253], [253, 261, 262, 254], [254, 262, 263, 255], [255, 263, 256, 248], [256, 264, 265, 257], [257, 265, 266, 258], [258, 266, 267, 259], [259, 267, 268, 260], [260, 268, 269, 261], [261, 269, 270, 262], [262, 270, 271, 263], [263, 271, 264, 256], [264, 272, 273, 265], [265, 273, 274, 266], [266, 274, 275, 267], [267, 275, 276, 268], [268, 276, 277, 269], [269, 277, 278, 270], [270, 278, 279, 271], [271, 279, 272, 264], [272, 280, 281, 273], [273, 281, 282, 274], [274, 282, 283, 275], [275, 283, 284, 276], [276, 284, 285, 277], [277, 285, 286, 278], [278, 286, 287, 279], [279, 287, 280, 272], [280, 288, 289, 281], [281, 289, 290, 282], [282, 290, 291, 283], [283, 291, 292, 284], [284, 292, 293, 285], [285, 293, 294, 286], [286, 294, 295, 287], [287, 295, 288, 280], [288, 296, 297, 289], [289, 297, 298, 290], [290, 298, 299, 291], [291, 299, 300, 292], [292, 300, 301, 293], [293, 301, 302, 294], [294, 302, 303, 295], [295, 303, 296, 288], [296, 304, 305, 297], [297, 305, 306, 298], [298, 306, 307, 299], [299, 307, 308, 300], [300, 308, 309, 301], [301, 309, 310, 302], [302, 310, 311, 303], [303, 311, 304, 296], [304, 312, 313, 305], [305, 313, 314, 306], [306, 314, 315, 307], [307, 315, 316, 308], [308, 316, 317, 309], [309, 317, 318, 310], [310, 318, 319, 311], [311, 319, 312, 304], [312, 320, 321, 313], [313, 321, 322, 314], [314, 322, 323, 315], [315, 323, 324, 316], [316, 324, 325, 317], [317, 325, 326, 318], [318, 326, 327, 319], [319, 327, 320, 312], [320, 328, 329, 321], [321, 329, 330, 322], [322, 330, 331, 323], [323, 331, 332, 324], [324, 332, 333, 325], [325, 333, 334, 326], [326, 334, 335, 327], [327, 335, 328, 320], [328, 336, 337, 329], [329, 337, 338, 330], [330, 338, 339, 331], [331, 339, 340, 332], [332, 340, 341, 333], [333, 341, 342, 334], [334, 342, 343, 335], [335, 343, 336, 328], [336, 344, 345, 337], [337, 345, 346, 338], [338, 346, 347, 339], [339, 347, 348, 340], [340, 348, 349, 341], [341, 349, 350, 342], [342, 350, 351, 343], [343, 351, 344, 336], [344, 352, 353, 345], [345, 353, 354, 346], [346, 354, 355, 347], [347, 355, 356, 348], [348, 356, 357, 349], [349, 357, 358, 350], [350, 358, 359, 351], [351, 359, 352, 344], [352, 360, 361, 353], [353, 361, 362, 354], [354, 362, 363, 355], [355, 363, 364, 356], [356, 364, 365, 357], [357, 365, 366, 358], [358, 366, 367, 359], [359, 367, 360, 352], [360, 368, 369, 361], [361, 369, 370, 362], [362, 370, 371, 363], [363, 371, 372, 364], [364, 372, 373, 365], [365, 373, 374, 366], [366, 374, 375, 367], [367, 375, 368, 360], [368, 376, 377, 369], [369, 377, 378, 370], [370, 378, 379, 371], [371, 379, 380, 372], [372, 380, 381, 373], [373, 381, 382, 374], [374, 382, 383, 375], [375, 383, 376, 368], [376, 384, 385, 377], [377, 385, 386, 378], [378, 386, 387, 379], [379, 387, 388, 380], [380, 388, 389, 381], [381, 389, 390, 382], [382, 390, 391, 383], [383, 391, 384, 376], [384, 392, 393, 385], [385, 393, 394, 386], [386, 394, 395, 387], [387, 395, 396, 388], [388, 396, 397, 389], [389, 397, 398, 390], [390, 398, 399, 391], [391, 399, 392, 384], [392, 400, 401, 393], [393, 401, 402, 394], [394, 402, 403, 395], [395, 403, 404, 396], [396, 404, 405, 397], [397, 405, 406, 398], [398, 406, 407, 399], [399, 407, 400, 392], [400, 408, 409, 401], [401, 409, 410, 402], [402, 410, 411, 403], [403, 411, 412, 404], [404, 412, 413, 405], [405, 413, 414, 406], [406, 414, 415, 407], [407, 415, 408, 400], [408, 416, 417, 409], [409, 417, 418, 410], [410, 418, 419, 411], [411, 419, 420, 412], [412, 420, 421, 413], [413, 421, 422, 414], [414, 422, 423, 415], [415, 423, 416, 408], [416, 424, 425, 417], [417, 425, 426, 418], [418, 426, 427, 419], [419, 427, 428, 420], [420, 428, 429, 421], [421, 429, 430, 422], [422, 430, 431, 423], [423, 431, 424, 416], [424, 432, 433, 425], [425, 433, 434, 426], [426, 434, 435, 427], [427, 435, 436, 428], [428, 436, 437, 429], [429, 437, 438, 430], [430, 438, 439, 431], [431, 439, 432, 424], [432, 440, 441, 433], [433, 441, 442, 434], [434, 442, 443, 435], [435, 443, 444, 436], [436, 444, 445, 437], [437, 445, 446, 438], [438, 446, 447, 439], [439, 447, 440, 432], [440, 448, 449, 441], [441, 449, 450, 442], [442, 450, 451, 443], [443, 451, 452, 444], [444, 452, 453, 445], [445, 453, 454, 446], [446, 454, 455, 447], [447, 455, 448, 440], [448, 456, 457, 449], [449, 457, 458, 450], [450, 458, 459, 451], [451, 459, 460, 452], [452, 460, 461, 453], [453, 461, 462, 454], [454, 462, 463, 455], [455, 463, 456, 448], [456, 464, 465, 457], [457, 465, 466, 458], [458, 466, 467, 459], [459, 467, 468, 460], [460, 468, 469, 461], [461, 469, 470, 462], [462, 470, 471, 463], [463, 471, 464, 456], [464, 472, 473, 465], [465, 473, 474, 466], [466, 474, 475, 467], [467, 475, 476, 468], [468, 476, 477, 469], [469, 477, 478, 470], [470, 478, 479, 471], [471, 479, 472, 464], [472, 480, 481, 473], [473, 481, 482, 474], [474, 482, 483, 475], [475, 483, 484, 476], [476, 484, 485, 477], [477, 485, 486, 478], [478, 486, 487, 479], [479, 487, 480, 472], [480, 488, 489, 481], [481, 489, 490, 482], [482, 490, 491, 483], [483, 491, 492, 484], [484, 492, 493, 485], [485, 493, 494, 486], [486, 494, 495, 487], [487, 495, 488, 480], [488, 496, 497, 489], [489, 497, 498, 490], [490, 498, 499, 491], [491, 499, 500, 492], [492, 500, 501, 493], [493, 501, 502, 494], [494, 502, 503, 495], [495, 503, 496, 488], [496, 504, 505, 497], [497, 505, 506, 498], [498, 506, 507, 499], [499, 507, 508, 500], [500, 508, 509, 501], [501, 509, 510, 502], [502, 510, 511, 503], [503, 511, 504, 496], [504, 512, 513, 505], [505, 513, 514, 506], [506, 514, 515, 507], [507, 515, 516, 508], [508, 516, 517, 509], [509, 517, 518, 510], [510, 518, 519, 511], [511, 519, 512, 504], [512, 0, 1, 513], [513, 1, 2, 514], [514, 2, 3, 515], [515, 3, 4, 516], [516, 4, 5, 517], [517, 5, 6, 518], [518, 6, 7, 519], [519, 7, 0, 512]], convexity=10);
        }
      }
    }
  }
} // end module default_5_default_5
